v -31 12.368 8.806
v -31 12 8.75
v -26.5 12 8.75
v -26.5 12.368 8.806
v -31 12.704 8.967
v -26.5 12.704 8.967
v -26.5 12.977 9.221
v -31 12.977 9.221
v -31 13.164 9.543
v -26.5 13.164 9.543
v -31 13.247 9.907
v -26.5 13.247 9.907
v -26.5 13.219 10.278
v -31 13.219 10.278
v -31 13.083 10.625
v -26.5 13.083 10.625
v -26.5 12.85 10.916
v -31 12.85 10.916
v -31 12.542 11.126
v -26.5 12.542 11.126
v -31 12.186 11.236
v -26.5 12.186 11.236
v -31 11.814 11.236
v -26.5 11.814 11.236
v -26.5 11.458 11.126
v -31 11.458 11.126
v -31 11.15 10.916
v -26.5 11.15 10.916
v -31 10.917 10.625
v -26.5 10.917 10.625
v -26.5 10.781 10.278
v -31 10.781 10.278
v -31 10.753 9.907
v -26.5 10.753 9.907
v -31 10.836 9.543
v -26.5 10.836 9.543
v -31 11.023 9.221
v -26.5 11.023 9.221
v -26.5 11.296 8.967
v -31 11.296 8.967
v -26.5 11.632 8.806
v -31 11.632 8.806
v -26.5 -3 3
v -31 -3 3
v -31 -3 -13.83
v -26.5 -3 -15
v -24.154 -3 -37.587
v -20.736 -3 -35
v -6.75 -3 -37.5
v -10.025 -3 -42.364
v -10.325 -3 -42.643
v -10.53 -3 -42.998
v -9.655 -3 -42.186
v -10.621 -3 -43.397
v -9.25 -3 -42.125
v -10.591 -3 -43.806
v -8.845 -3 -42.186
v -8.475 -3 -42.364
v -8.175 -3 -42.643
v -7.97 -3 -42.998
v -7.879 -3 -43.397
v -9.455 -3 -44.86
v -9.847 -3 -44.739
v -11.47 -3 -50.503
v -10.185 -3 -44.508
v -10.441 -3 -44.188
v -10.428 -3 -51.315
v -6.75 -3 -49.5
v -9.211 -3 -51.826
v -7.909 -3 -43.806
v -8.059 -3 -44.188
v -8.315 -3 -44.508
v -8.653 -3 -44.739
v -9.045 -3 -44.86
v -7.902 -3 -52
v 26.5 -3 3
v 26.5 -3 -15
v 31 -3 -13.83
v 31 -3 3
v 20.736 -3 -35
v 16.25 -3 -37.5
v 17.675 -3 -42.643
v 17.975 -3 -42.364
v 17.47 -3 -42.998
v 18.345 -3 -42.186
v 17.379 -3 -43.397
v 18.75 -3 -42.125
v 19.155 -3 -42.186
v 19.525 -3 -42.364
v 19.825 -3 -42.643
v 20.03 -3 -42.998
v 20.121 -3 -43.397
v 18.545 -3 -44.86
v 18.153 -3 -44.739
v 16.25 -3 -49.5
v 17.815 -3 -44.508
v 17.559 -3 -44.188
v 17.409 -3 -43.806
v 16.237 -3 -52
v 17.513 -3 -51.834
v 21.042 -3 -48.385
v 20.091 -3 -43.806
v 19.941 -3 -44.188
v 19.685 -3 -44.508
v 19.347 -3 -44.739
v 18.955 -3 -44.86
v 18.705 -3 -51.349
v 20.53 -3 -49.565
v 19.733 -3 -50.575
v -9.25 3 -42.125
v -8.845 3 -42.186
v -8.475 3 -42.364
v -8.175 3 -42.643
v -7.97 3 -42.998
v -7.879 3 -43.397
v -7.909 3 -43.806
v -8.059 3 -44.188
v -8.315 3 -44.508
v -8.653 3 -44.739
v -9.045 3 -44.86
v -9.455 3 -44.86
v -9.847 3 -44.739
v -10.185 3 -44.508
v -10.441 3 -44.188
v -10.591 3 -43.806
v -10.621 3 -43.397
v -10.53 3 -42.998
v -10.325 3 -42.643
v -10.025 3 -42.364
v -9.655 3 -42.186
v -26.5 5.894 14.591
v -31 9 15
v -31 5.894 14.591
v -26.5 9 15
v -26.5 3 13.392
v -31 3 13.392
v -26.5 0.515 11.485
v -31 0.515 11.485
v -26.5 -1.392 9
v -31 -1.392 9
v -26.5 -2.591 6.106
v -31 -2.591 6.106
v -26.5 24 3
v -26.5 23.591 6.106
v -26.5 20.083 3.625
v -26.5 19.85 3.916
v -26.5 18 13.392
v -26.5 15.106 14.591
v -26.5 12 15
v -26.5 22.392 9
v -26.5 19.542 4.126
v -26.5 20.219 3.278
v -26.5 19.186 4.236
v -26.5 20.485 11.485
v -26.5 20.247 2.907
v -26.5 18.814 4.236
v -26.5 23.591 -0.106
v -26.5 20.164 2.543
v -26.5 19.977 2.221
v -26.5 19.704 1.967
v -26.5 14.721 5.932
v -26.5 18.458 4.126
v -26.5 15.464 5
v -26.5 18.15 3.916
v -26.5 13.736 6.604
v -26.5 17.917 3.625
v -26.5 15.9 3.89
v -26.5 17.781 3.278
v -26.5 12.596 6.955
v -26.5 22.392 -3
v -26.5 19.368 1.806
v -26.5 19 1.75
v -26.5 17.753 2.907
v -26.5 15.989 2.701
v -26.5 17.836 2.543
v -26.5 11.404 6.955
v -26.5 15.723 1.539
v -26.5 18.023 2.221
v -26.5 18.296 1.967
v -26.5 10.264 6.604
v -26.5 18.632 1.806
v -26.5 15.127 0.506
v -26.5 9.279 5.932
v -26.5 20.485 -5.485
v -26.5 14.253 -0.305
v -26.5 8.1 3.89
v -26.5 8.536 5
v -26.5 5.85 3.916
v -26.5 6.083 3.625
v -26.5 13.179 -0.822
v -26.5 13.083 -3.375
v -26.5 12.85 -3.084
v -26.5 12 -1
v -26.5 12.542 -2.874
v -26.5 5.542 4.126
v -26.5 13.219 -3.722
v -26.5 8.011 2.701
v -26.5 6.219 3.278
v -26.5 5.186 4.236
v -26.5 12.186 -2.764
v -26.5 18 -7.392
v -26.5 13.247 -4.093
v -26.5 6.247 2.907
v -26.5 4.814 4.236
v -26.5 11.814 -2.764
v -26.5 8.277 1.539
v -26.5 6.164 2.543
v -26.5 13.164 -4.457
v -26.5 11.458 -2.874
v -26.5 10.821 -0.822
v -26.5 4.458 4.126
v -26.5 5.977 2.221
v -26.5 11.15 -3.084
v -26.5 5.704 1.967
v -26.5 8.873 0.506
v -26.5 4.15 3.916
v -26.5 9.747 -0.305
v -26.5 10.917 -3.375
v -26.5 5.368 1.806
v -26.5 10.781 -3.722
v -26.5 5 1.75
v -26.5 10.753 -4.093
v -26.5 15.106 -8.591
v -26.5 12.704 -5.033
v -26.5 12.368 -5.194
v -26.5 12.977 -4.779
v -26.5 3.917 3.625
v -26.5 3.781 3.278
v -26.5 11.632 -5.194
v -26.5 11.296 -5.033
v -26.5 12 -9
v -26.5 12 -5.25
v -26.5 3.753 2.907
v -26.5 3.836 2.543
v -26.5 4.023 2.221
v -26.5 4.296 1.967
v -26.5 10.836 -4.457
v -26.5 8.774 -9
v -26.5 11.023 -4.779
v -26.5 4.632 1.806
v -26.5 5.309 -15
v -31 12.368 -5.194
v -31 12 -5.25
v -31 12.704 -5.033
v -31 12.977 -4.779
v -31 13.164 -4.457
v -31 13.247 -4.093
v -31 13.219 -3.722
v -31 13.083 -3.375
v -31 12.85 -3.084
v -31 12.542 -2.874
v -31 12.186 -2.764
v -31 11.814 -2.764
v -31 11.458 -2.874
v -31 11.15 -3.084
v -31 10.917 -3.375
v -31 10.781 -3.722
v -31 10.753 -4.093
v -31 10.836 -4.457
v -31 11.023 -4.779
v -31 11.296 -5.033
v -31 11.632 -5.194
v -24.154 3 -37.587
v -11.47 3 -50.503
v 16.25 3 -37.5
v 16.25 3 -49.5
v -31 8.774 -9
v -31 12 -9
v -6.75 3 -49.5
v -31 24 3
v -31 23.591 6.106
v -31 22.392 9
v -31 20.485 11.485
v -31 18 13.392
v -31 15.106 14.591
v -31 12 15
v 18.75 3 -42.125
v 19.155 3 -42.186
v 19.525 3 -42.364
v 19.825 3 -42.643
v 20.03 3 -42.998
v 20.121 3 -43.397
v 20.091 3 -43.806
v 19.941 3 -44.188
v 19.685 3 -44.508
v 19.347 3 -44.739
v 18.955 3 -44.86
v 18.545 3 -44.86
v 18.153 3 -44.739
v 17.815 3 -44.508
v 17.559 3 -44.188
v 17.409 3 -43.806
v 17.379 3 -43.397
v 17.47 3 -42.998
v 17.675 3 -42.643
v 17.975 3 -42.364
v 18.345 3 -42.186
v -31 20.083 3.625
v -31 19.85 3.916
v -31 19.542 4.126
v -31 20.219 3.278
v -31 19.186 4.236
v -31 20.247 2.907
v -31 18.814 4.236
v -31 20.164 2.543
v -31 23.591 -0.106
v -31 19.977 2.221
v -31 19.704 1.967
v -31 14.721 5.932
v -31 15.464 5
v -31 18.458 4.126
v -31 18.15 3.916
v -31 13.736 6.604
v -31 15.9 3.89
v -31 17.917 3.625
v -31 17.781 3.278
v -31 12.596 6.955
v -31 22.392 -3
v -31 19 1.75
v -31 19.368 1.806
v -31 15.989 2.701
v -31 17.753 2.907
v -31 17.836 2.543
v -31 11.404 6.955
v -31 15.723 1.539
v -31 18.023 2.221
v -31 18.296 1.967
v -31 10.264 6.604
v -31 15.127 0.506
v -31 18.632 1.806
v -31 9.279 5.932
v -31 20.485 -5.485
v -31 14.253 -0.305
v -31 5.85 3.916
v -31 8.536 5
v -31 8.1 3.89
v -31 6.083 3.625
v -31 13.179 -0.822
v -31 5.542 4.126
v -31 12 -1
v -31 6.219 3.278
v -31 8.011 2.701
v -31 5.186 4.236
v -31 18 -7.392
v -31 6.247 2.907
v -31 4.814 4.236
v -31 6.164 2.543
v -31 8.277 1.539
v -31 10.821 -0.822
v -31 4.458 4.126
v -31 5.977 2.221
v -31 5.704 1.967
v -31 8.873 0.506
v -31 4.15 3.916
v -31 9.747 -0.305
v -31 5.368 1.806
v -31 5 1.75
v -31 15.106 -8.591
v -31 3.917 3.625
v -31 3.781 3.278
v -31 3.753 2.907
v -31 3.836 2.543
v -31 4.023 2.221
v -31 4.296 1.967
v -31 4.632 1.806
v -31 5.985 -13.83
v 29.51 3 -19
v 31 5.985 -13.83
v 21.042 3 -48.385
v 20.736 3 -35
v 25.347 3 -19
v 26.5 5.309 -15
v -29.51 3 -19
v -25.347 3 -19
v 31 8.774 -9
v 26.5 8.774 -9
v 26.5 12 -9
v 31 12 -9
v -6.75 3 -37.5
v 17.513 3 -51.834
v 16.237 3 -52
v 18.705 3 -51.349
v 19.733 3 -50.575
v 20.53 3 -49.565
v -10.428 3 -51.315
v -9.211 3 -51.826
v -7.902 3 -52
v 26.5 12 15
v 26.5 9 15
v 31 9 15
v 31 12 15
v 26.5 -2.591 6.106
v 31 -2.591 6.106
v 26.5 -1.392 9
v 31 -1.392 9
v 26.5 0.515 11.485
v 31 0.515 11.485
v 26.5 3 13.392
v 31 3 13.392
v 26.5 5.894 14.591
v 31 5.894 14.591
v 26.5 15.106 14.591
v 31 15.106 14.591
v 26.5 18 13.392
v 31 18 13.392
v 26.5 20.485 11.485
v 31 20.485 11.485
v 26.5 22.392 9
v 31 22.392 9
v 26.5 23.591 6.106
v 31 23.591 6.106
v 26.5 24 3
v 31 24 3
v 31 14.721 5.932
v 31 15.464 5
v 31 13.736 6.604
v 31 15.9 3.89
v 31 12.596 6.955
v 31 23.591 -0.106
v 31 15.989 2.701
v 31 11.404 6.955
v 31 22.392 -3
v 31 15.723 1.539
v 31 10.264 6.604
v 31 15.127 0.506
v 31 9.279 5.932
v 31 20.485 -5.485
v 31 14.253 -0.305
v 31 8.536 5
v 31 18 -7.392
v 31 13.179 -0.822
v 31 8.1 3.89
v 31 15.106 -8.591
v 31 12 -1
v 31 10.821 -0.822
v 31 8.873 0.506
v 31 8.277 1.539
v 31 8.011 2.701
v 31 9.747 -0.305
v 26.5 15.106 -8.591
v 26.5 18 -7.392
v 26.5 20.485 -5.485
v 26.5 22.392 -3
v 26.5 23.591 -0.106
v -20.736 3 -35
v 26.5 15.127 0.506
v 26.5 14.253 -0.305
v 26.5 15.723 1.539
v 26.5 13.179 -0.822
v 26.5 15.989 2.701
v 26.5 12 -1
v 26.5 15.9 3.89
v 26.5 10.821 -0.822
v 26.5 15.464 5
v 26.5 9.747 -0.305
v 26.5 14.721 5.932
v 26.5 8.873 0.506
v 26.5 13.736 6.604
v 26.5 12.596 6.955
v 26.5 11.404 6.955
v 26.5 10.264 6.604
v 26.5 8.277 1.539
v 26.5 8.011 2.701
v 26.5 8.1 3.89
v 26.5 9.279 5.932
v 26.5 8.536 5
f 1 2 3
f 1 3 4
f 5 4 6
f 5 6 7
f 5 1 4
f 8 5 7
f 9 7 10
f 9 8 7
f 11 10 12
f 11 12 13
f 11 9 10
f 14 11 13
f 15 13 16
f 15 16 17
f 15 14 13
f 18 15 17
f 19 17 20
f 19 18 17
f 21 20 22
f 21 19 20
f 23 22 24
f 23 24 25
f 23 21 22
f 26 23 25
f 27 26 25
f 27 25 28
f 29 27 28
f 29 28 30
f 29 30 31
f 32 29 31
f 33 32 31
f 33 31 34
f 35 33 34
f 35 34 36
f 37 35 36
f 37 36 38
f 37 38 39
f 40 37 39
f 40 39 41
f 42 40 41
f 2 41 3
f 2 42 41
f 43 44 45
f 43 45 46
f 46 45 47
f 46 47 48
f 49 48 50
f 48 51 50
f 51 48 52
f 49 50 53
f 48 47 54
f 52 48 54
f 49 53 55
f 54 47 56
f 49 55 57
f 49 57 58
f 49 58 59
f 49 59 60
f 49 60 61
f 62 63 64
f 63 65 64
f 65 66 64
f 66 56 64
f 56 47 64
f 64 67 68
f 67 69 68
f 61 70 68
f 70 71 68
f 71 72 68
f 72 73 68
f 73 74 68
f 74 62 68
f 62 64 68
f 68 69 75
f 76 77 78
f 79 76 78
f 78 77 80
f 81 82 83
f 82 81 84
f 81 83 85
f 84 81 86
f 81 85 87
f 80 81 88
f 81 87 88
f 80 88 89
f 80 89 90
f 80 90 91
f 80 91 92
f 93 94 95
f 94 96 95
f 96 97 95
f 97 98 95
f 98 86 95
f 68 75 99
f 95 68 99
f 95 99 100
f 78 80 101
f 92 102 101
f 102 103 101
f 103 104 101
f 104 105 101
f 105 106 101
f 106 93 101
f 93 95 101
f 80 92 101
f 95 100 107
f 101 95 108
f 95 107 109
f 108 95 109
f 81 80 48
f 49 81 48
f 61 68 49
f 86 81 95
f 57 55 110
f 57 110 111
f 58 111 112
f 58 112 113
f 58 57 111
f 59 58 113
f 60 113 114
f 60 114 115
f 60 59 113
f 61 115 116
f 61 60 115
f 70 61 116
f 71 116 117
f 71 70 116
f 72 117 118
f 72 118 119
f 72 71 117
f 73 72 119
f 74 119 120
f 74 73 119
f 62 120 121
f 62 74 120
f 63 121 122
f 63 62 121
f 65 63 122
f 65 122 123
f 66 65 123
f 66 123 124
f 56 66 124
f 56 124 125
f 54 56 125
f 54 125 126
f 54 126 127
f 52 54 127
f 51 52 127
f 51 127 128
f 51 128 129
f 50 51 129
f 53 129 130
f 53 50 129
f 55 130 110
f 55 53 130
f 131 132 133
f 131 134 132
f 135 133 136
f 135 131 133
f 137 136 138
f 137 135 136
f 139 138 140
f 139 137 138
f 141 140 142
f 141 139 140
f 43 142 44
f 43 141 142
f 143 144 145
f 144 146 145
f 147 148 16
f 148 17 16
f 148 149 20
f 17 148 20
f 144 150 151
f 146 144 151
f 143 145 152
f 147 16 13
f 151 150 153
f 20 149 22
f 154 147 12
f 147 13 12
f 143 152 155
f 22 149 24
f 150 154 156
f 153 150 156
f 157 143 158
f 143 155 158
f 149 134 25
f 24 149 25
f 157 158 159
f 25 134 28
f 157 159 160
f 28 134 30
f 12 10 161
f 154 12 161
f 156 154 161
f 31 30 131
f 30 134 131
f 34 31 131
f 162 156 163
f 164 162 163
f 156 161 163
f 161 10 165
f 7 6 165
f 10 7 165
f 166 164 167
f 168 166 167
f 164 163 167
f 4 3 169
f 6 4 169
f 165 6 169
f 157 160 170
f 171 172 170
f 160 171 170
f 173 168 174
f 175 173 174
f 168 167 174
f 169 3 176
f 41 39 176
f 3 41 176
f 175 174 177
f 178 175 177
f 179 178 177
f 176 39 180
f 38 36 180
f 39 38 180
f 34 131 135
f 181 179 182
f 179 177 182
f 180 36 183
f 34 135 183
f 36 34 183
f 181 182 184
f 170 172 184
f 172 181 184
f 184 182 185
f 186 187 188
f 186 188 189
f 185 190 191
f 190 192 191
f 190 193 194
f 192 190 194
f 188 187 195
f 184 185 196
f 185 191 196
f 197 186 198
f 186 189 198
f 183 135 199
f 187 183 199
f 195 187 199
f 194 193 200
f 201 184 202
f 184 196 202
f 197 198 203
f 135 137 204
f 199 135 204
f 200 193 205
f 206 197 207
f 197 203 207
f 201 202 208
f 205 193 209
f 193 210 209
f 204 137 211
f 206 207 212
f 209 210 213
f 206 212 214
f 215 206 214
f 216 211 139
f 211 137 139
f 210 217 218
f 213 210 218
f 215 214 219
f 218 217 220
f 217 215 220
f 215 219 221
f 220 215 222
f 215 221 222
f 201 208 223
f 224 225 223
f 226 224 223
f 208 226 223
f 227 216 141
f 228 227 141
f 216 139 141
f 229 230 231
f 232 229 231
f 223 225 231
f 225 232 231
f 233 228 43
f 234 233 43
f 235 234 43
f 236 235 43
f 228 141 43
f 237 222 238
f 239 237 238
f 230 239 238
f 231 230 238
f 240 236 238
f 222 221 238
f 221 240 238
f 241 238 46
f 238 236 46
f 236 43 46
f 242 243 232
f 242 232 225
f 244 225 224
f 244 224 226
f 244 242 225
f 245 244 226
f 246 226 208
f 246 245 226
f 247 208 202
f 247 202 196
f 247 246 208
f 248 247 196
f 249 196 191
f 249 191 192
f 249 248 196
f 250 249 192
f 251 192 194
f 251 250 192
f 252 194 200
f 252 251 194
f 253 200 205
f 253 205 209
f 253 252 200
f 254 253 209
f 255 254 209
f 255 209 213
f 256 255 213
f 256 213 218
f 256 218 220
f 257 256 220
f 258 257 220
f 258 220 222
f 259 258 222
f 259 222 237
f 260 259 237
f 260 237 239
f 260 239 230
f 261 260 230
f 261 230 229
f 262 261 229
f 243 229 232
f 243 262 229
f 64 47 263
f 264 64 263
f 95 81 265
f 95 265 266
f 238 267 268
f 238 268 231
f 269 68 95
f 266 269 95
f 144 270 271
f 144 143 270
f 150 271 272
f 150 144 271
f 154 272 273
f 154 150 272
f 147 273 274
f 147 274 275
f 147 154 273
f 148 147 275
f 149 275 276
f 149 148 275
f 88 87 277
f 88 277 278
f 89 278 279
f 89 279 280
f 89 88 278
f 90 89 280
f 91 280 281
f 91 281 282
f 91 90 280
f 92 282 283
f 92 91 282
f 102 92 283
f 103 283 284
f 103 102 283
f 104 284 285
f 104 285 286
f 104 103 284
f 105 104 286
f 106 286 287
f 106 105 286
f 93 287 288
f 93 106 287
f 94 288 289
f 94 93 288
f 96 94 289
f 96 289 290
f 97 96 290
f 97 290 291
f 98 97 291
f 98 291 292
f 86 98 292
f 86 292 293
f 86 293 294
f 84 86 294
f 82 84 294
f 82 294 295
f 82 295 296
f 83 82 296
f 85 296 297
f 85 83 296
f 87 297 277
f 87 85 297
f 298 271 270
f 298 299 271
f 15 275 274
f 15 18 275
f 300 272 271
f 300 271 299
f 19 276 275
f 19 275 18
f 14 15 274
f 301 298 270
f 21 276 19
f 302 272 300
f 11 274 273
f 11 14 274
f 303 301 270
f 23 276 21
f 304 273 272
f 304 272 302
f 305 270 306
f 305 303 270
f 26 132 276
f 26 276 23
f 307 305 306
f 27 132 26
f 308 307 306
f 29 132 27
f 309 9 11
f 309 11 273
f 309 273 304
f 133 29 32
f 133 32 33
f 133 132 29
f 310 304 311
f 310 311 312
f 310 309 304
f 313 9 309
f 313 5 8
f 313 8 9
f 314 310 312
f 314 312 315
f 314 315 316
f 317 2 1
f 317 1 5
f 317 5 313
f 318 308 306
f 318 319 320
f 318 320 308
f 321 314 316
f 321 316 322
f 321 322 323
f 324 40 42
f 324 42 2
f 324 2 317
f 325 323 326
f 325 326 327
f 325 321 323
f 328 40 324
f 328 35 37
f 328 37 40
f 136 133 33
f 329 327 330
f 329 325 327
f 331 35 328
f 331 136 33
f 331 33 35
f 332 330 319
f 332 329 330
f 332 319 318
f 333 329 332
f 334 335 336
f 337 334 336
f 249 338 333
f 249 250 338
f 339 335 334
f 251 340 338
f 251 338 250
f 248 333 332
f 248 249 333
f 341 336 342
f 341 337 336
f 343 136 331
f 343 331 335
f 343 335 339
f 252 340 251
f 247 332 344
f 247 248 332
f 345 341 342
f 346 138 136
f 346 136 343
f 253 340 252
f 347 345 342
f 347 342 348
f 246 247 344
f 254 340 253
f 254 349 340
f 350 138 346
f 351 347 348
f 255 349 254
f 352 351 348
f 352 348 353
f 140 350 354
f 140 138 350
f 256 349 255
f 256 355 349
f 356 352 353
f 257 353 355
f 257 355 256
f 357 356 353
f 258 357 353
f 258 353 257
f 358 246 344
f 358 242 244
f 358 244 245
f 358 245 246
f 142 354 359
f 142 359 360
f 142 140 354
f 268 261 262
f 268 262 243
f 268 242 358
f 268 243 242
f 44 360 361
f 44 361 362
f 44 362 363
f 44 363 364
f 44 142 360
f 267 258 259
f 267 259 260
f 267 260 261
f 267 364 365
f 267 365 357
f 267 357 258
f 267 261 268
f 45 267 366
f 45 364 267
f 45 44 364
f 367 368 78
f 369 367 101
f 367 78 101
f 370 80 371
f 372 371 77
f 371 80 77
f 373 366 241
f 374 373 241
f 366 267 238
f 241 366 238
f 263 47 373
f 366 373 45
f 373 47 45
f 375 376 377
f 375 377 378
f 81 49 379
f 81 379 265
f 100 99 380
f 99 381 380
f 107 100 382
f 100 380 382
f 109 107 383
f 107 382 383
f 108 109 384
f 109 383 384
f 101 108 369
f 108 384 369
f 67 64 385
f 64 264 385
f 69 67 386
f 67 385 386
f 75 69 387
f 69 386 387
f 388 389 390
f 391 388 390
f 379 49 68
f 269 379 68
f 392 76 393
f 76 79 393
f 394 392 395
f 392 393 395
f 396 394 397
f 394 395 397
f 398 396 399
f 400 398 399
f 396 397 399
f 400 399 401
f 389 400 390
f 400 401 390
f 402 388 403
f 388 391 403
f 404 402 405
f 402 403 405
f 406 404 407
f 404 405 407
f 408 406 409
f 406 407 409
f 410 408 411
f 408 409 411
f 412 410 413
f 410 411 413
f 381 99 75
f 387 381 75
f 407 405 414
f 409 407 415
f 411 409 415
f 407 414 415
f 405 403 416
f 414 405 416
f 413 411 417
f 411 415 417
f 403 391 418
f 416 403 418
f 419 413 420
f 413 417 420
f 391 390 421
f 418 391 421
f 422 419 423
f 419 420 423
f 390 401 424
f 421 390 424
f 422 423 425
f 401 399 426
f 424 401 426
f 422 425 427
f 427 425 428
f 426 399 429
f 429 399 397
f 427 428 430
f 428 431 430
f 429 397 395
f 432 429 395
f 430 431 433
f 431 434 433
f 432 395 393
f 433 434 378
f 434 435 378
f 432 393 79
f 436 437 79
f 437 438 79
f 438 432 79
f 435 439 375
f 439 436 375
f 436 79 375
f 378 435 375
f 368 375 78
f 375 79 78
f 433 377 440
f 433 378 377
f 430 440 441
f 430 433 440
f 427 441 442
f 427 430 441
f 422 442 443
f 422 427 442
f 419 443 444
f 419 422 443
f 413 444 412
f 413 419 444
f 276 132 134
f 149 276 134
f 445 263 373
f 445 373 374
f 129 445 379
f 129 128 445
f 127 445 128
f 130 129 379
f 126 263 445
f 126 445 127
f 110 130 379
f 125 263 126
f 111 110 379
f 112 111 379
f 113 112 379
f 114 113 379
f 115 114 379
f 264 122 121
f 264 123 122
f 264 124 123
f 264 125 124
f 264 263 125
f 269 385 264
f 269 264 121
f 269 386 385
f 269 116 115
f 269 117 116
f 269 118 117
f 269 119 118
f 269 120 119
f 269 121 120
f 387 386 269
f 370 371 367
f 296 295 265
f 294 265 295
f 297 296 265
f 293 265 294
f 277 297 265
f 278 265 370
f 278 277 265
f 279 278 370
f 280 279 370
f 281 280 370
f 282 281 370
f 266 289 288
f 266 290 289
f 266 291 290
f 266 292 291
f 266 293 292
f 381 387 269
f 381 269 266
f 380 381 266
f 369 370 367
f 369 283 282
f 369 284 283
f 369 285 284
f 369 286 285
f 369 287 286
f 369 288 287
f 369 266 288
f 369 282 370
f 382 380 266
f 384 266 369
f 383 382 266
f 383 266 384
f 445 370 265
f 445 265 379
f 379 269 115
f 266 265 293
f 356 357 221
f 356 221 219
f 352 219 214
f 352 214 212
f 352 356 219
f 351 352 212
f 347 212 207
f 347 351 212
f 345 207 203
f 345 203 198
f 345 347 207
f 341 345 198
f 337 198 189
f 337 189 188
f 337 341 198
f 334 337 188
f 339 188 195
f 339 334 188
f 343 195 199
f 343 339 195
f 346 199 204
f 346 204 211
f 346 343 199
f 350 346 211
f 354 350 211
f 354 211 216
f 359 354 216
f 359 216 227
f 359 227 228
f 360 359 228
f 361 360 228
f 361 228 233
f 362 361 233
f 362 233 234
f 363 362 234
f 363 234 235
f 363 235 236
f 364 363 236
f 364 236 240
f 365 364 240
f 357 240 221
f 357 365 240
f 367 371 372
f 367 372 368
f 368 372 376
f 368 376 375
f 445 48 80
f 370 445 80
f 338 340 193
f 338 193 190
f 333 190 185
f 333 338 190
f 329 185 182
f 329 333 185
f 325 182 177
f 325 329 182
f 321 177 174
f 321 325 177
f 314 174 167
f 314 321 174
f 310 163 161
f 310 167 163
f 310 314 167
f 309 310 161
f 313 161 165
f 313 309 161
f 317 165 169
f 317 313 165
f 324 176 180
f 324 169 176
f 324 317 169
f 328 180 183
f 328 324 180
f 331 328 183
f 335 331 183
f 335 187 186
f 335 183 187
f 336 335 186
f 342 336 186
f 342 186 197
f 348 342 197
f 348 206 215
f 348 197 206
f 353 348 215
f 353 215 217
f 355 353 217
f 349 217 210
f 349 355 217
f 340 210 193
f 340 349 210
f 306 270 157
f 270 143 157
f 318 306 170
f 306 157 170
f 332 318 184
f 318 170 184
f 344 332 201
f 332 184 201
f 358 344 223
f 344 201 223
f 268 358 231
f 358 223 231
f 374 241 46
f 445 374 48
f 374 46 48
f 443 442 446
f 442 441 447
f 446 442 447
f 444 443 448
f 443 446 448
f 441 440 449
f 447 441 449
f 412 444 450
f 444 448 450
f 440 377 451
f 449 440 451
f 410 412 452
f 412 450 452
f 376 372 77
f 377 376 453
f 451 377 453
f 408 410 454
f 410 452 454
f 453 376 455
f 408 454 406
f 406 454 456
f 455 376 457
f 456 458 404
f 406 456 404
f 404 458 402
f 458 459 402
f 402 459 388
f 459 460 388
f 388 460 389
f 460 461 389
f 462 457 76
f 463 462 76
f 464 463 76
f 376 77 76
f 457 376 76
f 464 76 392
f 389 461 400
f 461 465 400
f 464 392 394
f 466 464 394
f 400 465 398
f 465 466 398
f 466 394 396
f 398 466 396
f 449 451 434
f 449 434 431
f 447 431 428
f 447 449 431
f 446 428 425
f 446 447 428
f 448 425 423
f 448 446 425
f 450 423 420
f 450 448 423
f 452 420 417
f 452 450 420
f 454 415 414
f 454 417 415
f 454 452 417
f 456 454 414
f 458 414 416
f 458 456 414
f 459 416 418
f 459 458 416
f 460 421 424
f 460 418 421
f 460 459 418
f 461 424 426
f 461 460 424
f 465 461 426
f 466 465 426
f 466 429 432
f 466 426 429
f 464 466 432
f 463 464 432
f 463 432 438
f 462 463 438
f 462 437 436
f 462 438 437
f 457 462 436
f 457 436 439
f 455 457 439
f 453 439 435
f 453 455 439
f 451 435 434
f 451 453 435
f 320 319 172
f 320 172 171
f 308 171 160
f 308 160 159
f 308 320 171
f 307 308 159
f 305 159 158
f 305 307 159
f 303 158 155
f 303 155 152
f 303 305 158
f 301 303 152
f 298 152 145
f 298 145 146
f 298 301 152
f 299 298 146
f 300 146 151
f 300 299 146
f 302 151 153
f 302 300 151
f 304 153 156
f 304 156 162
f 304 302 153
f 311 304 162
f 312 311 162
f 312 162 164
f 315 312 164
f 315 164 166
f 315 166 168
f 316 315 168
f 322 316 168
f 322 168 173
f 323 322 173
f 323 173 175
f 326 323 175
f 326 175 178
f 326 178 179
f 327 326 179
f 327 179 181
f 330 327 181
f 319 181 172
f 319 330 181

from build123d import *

# Parameters (mm, degrees)
BOSS_EXTRUDE1_DEPTH      = 3
BOSS_EXTRUDE1_DEPTH_BACK = 3
SKETCH1_R                = 1.375
SKETCH1_W                = 23
SKETCH1_H                = 12
SKETCH2_W                = 4.5
SKETCH2_H                = 24
BOSS_EXTRUDE2_DEPTH      = 21
CUT_EXTRUDE3_START       = -4.5
CUT_EXTRUDE3_OUTLINE_R   = 1.25
CUT_EXTRUDE3_DEPTH       = 4.5
CUT_EXTRUDE4_DEPTH       = 82.155714525
CUT_EXTRUDE4_DEPTH_BACK  = 82.155714525
SKETCH8_R                = 4
FILLET1_R                = 12
CHAMFER2_SIZE            = 10
CHAMFER2_SIZE2           = 5.773502692
CHAMFER3_SIZE            = 15
CHAMFER3_SIZE2           = 10
FILLET2_R                = 5


# Read off the part's stored shape, not the designer's step: Cut-Extrude3
with BuildPart() as part:
    # Sketch1 → Boss-Extrude1 (new, two sides: drawn at the far end of the back side and taken through both)
    with BuildSketch(Plane(origin=(0, 0, 0), x_dir=(1, 0, 0), z_dir=(0, 1, 0)).offset(-BOSS_EXTRUDE1_DEPTH_BACK)):
        Polygon((-31, 13.829866561), (-31, -15), (-26.5, -15), (-26.5, 15), (-20.736331389, 35), (20.736331389, 35), (26.5, 15), (26.5, -15), (31, -15), (31, 13.829866561), (20, 52), (-20, 52), align=None)
        with Locations(Location((18.75, 43.5, 0), (0, 0, 270))):
            Circle(SKETCH1_R, mode=Mode.SUBTRACT)
        with Locations(Location((-9.25, 43.5, 0), (0, 0, 270))):
            Circle(SKETCH1_R, mode=Mode.SUBTRACT)
        with Locations((4.75, 43.5)):
            Rectangle(SKETCH1_W, SKETCH1_H, mode=Mode.SUBTRACT)
    extrude(amount=BOSS_EXTRUDE1_DEPTH + BOSS_EXTRUDE1_DEPTH_BACK)

    # Sketch2 → Boss-Extrude2 (add)
    with BuildSketch(Plane(origin=(0, 3, 0), x_dir=(1, 0, 0), z_dir=(0, 1, 0))):
        with Locations((-28.75, -3)):
            Rectangle(SKETCH2_W, SKETCH2_H)
        with Locations((28.75, -3)):
            Rectangle(SKETCH2_W, SKETCH2_H)
    extrude(amount=BOSS_EXTRUDE2_DEPTH)

    # Cut-Extrude3 outline → Cut-Extrude3 (cut)
    with BuildSketch(Plane(origin=(-26.5, 0, 0), x_dir=(0, 0, -1), z_dir=(1, 0, 0)).offset(CUT_EXTRUDE3_START)):
        with Locations((-3, 19)):
            Circle(CUT_EXTRUDE3_OUTLINE_R)
        with Locations((4, 12)):
            Circle(CUT_EXTRUDE3_OUTLINE_R)
        with Locations((-3, 5)):
            Circle(CUT_EXTRUDE3_OUTLINE_R)
        with Locations((-10, 12)):
            Circle(CUT_EXTRUDE3_OUTLINE_R)
    extrude(amount=CUT_EXTRUDE3_DEPTH, mode=Mode.SUBTRACT)

    # Sketch8 → Cut-Extrude4 (cut, two sides: drawn at the far end of the back side and taken through both)
    with BuildSketch(Plane(origin=(-26.5, 0, 0), x_dir=(0, 0, -1), z_dir=(1, 0, 0)).offset(-CUT_EXTRUDE4_DEPTH_BACK)):
        with Locations((-3, 12)):
            Circle(SKETCH8_R)
    extrude(amount=CUT_EXTRUDE4_DEPTH + CUT_EXTRUDE4_DEPTH_BACK, mode=Mode.SUBTRACT)

    # Fillet1
    fillet1_edges = [part.edges().sort_by_distance(p)[0] for p in [
        (28.75, -3, 15),
        (-28.75, -3, 15),
        (-28.75, 24, -9),
        (28.75, 24, -9),
        (28.75, 24, 15),
        (-28.75, 24, 15),
    ]]
    fillet(fillet1_edges, radius=FILLET1_R - 0.0001)  # a hair under: the kernel refuses the full size

    # Chamfer2
    chamfer2_edges = [part.edges().sort_by_distance(p)[0] for p in [
        (-28.75, 3, -9),
        (28.75, 3, -9),
    ]]
    chamfer2_side = [part.faces().sort_by_distance(p)[0] for p in [
        (-1.966040558, 3, -36.302482854),
    ]]
    chamfer(chamfer2_edges, length=CHAMFER2_SIZE, length2=CHAMFER2_SIZE2, reference=chamfer2_side[0])

    # Chamfer3
    chamfer3_edges = [part.edges().sort_by_distance(p)[0] for p in [
        (-20, 0, -52),
    ]]
    chamfer3_side = [part.faces().sort_by_distance(p)[0] for p in [
        (-25.663082519, 0.130215421, -32.349034961),
    ]]
    chamfer(chamfer3_edges, length=CHAMFER3_SIZE, length2=CHAMFER3_SIZE2, reference=chamfer3_side[0])

    # Fillet2
    fillet2_edges = [part.edges().sort_by_distance(p)[0] for p in [
        (20, 0, -52),
        (-10, 0, -52),
    ]]
    fillet(fillet2_edges, radius=FILLET2_R)


solid = part.part
